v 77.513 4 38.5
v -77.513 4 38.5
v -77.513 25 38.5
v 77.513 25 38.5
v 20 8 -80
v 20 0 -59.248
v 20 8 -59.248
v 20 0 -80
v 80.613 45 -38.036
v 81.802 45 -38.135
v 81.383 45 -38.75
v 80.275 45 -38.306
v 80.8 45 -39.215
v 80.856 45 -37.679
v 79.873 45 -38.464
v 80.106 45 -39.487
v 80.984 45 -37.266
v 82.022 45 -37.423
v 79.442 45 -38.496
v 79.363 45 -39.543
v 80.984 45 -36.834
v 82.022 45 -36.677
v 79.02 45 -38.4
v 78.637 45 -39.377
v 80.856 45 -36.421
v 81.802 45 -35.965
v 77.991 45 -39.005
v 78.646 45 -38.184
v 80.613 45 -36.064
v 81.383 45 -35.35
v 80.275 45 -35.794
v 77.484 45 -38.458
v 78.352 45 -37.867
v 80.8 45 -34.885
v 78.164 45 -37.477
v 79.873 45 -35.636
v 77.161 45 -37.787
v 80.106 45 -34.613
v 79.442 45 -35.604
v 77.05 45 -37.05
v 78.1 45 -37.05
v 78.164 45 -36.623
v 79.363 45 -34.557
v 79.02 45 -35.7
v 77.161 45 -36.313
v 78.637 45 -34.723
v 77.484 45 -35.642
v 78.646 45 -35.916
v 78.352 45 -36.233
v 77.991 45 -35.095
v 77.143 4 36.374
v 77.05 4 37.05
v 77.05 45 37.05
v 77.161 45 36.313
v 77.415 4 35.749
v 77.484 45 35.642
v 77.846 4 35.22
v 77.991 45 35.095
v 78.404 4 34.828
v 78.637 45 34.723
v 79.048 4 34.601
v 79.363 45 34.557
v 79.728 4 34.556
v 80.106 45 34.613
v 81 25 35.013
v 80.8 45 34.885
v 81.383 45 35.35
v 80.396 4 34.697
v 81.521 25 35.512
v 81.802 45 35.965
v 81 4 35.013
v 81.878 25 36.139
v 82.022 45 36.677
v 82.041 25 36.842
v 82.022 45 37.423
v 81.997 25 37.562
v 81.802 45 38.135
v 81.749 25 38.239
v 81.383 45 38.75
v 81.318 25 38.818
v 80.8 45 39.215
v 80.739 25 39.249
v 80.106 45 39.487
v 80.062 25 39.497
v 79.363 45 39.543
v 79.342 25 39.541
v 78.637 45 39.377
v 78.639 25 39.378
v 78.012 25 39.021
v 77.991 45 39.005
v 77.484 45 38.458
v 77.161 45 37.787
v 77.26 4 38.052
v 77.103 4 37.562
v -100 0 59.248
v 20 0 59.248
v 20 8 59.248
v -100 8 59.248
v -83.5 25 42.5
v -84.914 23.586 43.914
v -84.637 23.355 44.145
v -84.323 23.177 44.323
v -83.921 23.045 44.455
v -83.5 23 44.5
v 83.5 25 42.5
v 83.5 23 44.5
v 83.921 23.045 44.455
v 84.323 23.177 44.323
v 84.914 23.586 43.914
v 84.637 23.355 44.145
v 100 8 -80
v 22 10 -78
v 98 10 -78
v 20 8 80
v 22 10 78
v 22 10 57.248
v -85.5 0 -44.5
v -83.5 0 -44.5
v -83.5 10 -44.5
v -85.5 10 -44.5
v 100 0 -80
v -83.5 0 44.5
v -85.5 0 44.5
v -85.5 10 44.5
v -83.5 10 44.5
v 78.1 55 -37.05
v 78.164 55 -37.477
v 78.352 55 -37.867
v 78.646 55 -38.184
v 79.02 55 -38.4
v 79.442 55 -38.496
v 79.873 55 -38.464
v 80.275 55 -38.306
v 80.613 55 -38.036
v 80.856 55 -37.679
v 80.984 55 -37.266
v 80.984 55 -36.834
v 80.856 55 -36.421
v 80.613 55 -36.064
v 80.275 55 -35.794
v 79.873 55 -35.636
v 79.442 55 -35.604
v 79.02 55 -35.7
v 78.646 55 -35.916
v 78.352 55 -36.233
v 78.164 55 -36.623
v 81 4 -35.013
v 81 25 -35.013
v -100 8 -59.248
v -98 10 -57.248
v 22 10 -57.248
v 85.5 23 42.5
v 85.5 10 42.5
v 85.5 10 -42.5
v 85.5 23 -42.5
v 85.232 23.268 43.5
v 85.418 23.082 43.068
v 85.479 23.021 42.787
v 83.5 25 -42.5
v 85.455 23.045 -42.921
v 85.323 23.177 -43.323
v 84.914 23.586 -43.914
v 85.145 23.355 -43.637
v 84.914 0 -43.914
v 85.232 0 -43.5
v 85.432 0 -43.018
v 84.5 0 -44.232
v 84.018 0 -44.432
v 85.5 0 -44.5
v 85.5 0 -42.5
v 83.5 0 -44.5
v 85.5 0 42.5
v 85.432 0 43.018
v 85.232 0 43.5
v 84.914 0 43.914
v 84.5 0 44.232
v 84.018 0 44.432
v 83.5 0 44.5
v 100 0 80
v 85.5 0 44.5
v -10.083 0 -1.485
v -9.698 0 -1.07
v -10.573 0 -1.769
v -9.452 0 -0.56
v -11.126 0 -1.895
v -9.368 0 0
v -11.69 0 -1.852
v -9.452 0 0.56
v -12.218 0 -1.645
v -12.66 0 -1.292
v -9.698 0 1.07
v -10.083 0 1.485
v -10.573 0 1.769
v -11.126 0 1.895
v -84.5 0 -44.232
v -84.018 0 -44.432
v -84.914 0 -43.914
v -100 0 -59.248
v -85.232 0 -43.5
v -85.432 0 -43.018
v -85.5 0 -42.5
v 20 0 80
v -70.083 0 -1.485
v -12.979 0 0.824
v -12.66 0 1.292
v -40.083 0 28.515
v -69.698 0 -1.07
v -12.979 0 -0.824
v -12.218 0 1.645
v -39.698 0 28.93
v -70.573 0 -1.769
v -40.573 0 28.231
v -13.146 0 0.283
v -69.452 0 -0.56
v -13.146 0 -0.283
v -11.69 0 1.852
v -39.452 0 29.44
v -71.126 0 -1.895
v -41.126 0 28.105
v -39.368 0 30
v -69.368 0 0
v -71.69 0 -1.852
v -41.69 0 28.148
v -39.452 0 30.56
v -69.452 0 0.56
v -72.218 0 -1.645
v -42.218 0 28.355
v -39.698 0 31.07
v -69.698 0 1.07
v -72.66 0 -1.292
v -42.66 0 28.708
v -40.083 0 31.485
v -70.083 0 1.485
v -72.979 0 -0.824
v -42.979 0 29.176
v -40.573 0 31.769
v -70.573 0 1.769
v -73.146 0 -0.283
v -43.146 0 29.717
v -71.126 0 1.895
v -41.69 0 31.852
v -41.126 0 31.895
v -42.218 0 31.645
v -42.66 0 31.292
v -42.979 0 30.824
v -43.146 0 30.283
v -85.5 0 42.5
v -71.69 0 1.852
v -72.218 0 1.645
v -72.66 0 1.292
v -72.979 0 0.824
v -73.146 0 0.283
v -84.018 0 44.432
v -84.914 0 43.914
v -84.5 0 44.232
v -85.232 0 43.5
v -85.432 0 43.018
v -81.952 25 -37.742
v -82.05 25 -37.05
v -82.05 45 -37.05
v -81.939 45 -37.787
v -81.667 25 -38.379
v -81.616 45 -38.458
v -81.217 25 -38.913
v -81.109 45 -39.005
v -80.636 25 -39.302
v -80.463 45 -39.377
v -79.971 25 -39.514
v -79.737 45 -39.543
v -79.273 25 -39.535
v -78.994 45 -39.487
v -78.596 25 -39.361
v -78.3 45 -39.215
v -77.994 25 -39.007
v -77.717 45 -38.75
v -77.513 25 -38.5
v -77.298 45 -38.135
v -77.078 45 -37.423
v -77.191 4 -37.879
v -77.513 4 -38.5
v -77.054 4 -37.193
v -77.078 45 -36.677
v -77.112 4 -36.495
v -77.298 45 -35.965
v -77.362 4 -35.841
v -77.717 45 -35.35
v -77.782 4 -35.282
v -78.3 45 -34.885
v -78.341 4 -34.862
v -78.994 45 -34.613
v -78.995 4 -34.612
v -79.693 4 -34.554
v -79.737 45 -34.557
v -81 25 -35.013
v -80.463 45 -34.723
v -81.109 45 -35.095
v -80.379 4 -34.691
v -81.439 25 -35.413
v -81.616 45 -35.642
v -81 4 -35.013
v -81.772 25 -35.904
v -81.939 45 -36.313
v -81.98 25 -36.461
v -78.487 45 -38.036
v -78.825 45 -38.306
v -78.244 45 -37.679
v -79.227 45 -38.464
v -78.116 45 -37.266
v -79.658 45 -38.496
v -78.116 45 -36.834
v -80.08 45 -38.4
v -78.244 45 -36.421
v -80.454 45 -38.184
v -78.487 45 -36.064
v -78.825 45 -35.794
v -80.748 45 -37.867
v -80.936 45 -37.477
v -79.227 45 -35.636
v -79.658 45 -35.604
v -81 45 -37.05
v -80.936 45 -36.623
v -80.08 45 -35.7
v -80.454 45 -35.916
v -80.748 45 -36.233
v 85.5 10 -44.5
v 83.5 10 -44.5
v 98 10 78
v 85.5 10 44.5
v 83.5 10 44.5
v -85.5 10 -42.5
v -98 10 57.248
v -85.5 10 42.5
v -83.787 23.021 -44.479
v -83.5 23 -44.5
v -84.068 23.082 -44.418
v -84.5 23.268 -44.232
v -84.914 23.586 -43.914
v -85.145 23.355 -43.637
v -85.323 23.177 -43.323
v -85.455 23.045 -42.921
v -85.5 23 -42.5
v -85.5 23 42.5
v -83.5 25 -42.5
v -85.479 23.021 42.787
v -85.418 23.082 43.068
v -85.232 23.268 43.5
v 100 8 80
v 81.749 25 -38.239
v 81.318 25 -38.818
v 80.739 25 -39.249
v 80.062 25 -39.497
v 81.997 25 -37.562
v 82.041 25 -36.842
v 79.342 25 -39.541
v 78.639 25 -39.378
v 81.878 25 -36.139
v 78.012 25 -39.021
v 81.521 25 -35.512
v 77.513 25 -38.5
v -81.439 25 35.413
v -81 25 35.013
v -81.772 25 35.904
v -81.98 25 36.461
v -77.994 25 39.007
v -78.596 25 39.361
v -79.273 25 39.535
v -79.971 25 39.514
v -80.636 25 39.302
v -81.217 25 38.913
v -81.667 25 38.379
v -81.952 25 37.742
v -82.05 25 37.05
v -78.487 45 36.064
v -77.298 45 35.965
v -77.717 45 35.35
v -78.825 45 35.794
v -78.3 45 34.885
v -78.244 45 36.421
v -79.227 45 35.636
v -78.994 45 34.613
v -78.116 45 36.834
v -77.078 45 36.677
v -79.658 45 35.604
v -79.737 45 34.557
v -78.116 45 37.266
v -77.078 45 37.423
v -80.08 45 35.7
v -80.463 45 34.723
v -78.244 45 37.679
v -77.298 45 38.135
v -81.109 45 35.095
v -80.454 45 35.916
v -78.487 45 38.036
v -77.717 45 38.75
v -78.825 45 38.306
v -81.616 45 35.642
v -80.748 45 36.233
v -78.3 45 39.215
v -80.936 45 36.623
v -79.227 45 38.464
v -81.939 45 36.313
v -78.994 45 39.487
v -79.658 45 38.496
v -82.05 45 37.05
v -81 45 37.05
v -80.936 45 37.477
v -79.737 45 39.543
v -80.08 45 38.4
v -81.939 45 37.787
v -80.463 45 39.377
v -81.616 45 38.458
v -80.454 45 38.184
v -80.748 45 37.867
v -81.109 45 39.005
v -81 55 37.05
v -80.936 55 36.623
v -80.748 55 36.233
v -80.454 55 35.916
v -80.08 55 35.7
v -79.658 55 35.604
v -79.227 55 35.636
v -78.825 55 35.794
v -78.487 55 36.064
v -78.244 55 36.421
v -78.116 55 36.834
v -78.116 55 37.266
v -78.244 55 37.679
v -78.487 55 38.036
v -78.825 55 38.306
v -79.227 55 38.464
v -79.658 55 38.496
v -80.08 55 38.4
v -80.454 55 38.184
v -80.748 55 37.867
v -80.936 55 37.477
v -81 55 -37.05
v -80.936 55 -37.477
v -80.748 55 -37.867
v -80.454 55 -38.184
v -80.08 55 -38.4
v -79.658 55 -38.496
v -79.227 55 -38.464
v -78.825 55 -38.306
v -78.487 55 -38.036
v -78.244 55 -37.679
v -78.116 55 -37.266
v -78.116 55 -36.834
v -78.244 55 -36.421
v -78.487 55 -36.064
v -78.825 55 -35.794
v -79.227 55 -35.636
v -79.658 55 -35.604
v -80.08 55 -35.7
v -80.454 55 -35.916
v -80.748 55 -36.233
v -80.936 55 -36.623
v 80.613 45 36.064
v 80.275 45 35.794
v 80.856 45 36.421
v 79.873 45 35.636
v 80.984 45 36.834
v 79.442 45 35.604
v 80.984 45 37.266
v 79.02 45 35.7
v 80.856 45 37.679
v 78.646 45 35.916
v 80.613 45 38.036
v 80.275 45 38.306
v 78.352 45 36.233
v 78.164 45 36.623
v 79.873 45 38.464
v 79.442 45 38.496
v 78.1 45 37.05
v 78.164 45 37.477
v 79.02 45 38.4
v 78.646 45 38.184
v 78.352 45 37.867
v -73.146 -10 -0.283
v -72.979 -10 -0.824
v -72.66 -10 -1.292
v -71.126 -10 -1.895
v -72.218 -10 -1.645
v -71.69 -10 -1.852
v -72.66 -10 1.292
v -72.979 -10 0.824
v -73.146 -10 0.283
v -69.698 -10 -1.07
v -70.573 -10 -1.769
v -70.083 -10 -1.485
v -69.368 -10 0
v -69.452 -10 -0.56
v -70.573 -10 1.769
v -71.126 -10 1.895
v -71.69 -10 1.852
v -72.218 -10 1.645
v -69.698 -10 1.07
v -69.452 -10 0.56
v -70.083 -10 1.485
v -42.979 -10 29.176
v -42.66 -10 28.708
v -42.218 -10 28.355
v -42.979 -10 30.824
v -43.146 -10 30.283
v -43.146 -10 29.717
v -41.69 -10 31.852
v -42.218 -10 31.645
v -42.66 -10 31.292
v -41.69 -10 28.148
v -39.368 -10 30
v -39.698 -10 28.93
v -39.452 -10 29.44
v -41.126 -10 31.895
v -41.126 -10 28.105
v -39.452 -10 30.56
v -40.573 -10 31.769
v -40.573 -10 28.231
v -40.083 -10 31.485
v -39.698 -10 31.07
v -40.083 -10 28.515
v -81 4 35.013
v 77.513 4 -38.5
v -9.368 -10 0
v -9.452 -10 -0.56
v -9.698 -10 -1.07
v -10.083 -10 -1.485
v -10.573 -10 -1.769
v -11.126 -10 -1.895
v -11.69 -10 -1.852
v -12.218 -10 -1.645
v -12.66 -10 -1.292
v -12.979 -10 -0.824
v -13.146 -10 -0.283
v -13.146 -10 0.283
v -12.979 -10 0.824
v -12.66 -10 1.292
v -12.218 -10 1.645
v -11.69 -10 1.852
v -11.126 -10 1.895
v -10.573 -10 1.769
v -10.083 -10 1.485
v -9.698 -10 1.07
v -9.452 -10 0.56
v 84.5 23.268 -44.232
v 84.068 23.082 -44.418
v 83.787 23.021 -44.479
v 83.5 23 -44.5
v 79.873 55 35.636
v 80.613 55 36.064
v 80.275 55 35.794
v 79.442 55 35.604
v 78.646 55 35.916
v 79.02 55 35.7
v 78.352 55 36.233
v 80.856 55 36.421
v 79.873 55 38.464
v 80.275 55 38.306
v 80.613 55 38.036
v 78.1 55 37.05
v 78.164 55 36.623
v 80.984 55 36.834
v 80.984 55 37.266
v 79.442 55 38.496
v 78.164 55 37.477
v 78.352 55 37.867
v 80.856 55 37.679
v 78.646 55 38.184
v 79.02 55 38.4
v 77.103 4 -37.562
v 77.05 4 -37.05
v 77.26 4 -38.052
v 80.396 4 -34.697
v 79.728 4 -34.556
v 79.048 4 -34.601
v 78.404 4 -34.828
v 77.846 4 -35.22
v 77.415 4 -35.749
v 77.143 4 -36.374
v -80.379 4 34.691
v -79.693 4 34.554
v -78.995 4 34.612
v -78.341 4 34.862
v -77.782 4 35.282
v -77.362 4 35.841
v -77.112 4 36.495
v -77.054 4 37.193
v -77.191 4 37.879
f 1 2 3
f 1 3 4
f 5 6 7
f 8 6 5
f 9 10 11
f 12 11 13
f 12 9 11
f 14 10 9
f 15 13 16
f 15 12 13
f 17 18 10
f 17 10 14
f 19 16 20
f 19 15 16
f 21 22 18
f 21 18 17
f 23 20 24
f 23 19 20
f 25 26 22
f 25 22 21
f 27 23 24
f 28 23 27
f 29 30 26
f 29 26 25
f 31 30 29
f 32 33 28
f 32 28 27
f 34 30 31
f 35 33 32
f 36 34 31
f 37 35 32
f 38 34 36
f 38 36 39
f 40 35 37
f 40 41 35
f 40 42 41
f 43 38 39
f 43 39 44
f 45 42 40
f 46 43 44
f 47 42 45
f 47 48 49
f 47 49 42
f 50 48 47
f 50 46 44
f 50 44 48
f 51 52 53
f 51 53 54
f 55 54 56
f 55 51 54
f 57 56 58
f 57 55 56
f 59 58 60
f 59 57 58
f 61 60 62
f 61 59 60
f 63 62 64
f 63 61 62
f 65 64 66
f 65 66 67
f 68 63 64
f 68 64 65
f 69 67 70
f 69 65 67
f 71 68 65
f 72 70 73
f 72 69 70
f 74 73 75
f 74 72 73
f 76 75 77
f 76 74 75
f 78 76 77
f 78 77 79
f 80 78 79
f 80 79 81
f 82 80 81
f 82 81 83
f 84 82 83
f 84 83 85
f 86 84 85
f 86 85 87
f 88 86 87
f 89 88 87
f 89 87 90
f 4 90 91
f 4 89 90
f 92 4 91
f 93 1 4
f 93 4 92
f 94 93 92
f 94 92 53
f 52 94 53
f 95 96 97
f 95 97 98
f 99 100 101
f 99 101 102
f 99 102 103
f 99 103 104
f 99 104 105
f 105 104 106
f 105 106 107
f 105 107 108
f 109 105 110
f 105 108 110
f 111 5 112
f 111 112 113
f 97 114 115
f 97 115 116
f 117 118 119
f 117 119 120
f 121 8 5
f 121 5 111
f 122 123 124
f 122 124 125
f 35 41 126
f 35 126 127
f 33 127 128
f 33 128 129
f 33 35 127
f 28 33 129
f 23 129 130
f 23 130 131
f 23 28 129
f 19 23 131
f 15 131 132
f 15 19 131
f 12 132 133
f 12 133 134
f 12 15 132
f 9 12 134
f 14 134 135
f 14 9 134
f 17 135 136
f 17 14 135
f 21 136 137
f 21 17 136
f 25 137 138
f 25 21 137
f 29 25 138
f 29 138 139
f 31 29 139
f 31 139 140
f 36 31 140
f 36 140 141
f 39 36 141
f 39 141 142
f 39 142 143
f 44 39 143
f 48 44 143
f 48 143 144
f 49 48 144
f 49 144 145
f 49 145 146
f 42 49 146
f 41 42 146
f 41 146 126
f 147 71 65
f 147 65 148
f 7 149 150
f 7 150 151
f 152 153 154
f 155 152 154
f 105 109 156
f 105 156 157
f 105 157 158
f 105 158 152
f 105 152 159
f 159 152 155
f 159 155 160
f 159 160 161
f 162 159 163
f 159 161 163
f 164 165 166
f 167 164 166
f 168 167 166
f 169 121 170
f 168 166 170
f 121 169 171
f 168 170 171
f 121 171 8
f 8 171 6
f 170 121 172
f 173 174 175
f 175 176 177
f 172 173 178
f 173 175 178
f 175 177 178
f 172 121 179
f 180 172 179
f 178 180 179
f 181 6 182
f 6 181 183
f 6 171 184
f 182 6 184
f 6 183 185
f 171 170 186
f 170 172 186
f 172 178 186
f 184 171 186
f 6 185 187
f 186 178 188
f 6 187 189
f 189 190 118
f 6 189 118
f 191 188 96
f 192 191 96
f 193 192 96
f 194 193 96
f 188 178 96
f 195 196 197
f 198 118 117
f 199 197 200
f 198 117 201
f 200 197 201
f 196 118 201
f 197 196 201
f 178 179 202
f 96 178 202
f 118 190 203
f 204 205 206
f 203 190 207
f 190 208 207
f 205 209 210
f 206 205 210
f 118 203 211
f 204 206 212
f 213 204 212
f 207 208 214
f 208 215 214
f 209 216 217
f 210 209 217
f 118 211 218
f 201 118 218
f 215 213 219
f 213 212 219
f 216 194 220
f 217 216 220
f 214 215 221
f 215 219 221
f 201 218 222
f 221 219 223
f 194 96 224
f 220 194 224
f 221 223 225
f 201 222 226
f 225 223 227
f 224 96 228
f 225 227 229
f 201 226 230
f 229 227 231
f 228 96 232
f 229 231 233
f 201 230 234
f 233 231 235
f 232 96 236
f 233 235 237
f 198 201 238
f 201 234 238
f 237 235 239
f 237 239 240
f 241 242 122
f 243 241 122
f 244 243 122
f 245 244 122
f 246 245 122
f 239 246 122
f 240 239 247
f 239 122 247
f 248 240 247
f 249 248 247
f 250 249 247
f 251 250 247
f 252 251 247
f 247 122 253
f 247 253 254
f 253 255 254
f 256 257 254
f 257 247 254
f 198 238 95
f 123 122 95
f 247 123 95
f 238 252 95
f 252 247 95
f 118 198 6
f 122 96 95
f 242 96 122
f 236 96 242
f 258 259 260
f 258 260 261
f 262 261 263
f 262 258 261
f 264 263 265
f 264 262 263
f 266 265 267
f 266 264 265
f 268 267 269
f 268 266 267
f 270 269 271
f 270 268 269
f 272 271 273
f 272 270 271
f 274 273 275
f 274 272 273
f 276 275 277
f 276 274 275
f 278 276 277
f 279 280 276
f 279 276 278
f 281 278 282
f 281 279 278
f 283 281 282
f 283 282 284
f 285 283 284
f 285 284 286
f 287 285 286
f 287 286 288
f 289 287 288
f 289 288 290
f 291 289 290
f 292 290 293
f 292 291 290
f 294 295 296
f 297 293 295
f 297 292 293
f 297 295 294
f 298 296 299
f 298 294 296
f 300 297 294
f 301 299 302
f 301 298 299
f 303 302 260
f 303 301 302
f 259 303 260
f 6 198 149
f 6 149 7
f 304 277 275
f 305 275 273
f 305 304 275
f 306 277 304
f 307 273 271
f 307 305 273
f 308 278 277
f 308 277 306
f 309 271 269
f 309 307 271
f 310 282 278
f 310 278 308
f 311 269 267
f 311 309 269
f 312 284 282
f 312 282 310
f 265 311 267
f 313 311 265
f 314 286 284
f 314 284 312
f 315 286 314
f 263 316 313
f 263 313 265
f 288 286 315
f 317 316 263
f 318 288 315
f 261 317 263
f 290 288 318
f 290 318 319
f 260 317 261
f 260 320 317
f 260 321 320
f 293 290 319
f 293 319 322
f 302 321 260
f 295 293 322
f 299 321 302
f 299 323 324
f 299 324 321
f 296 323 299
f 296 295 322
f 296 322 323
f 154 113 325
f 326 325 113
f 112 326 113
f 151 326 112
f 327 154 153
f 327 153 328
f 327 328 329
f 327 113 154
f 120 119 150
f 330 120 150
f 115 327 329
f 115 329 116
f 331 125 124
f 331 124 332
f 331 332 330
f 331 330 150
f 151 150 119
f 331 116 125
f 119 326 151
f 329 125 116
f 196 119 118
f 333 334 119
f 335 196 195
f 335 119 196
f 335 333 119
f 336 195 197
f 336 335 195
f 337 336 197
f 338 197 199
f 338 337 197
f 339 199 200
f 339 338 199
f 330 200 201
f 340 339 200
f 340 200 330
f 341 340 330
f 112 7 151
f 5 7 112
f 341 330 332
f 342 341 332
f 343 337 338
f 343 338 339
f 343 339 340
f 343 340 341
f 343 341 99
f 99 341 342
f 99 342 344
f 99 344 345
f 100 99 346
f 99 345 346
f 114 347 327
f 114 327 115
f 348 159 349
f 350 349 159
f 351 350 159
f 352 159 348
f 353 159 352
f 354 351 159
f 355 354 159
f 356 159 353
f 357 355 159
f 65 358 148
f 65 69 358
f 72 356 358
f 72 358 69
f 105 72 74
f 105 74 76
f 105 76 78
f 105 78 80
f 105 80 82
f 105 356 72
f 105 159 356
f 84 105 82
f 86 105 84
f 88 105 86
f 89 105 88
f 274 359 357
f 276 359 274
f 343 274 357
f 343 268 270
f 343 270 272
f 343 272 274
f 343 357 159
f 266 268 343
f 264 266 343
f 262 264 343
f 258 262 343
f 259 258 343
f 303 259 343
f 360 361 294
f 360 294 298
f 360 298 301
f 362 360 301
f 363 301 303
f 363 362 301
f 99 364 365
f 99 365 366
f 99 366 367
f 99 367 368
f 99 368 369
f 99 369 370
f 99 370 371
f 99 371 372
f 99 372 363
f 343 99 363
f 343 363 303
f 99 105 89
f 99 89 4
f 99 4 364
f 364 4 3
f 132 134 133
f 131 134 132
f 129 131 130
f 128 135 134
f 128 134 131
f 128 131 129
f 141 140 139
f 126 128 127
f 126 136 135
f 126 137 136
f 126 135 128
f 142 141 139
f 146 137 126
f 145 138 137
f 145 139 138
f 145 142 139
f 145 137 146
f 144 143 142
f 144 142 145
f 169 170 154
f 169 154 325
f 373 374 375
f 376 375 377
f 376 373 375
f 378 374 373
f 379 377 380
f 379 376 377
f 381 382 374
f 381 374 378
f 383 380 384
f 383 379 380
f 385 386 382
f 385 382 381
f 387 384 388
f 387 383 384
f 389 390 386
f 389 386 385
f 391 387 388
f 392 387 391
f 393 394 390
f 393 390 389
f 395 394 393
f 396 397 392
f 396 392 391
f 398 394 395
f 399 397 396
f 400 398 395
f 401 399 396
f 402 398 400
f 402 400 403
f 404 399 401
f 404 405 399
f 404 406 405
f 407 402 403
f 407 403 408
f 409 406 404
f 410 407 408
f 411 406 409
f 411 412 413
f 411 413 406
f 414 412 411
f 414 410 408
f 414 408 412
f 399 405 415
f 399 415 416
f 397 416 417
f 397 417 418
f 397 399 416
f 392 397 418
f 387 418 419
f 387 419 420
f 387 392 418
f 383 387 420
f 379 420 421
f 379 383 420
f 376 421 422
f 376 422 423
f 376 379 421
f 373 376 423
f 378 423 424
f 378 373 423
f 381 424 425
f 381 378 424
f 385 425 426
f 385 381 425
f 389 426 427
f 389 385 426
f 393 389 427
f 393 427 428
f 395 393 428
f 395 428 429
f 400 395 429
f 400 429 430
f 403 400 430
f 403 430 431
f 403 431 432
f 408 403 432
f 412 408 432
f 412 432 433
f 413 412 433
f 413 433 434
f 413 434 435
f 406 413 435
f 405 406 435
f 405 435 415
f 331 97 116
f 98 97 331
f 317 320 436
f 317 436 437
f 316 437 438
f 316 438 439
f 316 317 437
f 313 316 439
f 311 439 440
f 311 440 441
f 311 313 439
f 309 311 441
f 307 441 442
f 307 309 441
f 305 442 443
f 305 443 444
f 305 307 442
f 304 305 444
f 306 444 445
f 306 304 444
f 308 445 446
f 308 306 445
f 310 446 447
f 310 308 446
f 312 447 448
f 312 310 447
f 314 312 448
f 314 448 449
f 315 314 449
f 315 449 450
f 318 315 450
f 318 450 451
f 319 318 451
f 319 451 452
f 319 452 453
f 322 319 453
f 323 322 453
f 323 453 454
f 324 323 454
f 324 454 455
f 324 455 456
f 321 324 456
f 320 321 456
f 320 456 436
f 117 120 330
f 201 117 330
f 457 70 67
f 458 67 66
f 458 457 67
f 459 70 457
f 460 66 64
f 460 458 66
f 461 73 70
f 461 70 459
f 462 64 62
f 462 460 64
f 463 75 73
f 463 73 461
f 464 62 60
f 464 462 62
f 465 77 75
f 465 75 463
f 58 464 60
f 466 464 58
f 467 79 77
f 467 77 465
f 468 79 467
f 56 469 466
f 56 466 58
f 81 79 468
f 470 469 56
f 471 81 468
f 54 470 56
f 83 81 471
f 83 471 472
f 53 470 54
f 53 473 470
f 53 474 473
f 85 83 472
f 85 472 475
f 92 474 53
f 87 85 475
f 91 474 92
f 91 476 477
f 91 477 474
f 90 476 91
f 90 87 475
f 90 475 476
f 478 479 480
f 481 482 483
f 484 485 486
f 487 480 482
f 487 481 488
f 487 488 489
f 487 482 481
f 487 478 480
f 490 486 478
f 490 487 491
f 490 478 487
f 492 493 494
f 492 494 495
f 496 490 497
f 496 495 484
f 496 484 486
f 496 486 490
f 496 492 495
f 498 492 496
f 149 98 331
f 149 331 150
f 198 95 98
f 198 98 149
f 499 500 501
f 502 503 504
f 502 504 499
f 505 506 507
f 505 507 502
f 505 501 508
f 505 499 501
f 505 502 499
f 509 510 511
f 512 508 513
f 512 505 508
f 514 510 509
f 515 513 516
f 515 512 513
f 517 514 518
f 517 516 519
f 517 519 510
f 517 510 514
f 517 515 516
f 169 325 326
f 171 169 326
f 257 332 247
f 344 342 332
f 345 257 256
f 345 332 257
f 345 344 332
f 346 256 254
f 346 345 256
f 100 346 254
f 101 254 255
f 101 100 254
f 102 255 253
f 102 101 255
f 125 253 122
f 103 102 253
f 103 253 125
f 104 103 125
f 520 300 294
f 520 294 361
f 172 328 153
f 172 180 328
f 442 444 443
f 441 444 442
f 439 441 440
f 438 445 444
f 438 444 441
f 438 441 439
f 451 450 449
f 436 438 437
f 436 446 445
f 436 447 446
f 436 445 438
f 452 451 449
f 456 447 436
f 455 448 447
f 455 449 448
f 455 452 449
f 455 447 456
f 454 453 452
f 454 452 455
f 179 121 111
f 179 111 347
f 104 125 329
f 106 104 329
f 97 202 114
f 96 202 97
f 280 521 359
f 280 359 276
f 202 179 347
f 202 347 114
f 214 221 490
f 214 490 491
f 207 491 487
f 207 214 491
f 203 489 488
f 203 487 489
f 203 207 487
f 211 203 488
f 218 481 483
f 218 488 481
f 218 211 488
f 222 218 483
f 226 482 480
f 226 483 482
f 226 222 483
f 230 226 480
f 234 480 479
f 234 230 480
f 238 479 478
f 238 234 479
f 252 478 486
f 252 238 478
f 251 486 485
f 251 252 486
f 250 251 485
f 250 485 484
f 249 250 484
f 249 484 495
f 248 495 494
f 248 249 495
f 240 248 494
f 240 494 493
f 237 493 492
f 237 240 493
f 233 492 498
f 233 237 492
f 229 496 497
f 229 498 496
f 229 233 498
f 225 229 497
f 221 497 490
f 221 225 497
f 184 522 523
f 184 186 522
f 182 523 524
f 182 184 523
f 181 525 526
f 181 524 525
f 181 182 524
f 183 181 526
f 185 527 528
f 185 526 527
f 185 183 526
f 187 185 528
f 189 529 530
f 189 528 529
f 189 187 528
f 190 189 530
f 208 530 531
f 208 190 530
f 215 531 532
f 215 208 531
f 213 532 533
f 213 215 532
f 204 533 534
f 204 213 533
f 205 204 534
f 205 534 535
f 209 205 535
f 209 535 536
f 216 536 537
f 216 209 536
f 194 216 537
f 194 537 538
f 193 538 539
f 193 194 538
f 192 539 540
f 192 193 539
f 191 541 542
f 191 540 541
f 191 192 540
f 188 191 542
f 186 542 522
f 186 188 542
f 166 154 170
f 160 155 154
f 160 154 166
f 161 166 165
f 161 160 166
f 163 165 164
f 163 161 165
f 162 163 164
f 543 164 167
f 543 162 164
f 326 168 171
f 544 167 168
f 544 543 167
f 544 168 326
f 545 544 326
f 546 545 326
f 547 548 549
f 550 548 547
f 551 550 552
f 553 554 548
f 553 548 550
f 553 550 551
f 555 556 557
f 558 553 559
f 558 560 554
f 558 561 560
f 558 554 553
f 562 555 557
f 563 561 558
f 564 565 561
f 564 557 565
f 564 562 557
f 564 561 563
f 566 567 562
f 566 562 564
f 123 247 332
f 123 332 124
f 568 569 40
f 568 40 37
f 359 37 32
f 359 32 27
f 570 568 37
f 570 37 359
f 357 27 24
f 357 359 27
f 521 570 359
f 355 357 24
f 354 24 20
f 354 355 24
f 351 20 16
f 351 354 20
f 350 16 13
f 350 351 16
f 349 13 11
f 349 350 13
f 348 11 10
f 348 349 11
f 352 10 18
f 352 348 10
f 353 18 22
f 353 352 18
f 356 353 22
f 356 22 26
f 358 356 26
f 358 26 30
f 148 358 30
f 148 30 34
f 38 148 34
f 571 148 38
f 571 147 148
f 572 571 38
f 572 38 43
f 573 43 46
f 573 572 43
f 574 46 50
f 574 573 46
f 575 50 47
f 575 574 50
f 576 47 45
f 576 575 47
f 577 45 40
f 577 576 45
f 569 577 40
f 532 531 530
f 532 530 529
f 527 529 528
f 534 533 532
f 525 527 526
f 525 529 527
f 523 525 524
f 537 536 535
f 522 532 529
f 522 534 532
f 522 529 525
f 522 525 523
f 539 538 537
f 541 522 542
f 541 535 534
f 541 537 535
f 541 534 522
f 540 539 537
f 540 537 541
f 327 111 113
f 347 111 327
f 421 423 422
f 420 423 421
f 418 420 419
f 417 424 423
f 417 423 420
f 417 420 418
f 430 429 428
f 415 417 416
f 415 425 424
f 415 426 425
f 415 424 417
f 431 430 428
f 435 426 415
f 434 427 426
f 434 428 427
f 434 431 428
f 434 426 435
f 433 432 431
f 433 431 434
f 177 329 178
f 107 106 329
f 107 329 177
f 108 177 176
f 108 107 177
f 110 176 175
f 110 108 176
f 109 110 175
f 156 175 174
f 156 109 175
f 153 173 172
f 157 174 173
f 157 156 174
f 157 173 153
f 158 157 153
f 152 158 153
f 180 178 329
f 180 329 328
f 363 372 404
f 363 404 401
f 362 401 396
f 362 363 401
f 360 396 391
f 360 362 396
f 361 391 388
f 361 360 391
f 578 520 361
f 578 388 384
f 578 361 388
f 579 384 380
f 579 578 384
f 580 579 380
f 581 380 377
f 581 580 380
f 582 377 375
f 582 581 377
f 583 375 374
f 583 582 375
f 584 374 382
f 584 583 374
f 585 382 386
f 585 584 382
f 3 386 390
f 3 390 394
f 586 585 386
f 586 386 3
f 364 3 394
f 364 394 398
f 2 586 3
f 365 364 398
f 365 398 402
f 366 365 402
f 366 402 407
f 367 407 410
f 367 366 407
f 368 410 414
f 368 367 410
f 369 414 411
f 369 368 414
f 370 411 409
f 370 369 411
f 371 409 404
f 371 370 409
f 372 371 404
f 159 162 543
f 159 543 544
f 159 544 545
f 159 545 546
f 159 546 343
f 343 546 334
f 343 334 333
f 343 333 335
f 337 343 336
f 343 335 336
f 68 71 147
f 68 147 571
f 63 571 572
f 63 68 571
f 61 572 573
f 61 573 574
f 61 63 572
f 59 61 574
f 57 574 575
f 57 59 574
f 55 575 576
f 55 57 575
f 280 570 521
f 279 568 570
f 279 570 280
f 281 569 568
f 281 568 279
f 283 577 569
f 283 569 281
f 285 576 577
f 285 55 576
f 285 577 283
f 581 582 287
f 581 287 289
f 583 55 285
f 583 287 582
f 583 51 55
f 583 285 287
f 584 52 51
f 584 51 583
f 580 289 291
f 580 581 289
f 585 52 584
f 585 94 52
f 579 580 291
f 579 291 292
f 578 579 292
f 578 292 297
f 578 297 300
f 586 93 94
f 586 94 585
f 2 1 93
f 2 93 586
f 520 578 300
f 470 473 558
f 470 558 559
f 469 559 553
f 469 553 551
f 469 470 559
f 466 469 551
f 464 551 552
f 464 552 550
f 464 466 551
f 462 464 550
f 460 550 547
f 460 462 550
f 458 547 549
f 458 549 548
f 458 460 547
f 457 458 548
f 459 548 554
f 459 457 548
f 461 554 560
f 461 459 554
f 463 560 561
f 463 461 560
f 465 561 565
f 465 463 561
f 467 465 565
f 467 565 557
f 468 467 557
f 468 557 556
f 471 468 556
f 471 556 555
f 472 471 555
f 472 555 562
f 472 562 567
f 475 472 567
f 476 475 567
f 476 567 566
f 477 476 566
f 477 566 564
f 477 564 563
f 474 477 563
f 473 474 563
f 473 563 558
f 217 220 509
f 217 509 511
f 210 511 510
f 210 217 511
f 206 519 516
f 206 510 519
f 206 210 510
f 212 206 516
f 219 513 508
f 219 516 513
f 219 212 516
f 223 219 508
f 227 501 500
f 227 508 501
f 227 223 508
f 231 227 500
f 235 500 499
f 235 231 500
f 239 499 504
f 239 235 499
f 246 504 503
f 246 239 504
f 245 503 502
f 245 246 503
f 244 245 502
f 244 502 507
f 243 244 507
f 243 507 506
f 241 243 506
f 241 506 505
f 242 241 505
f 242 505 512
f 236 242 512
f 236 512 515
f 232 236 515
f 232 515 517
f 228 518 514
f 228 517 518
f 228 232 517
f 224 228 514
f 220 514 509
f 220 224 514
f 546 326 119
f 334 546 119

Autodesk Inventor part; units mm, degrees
ref_plane "YZ Plane" through (0, 0, 0) normal (1, 0, 0) x (0, 1, 0)
ref_plane "XZ Plane" through (0, 0, 0) normal (0, 1, 0) x (-1, 0, 0)
ref_plane "XY Plane" through (0, 0, 0) normal (0, 0, 1) x (1, 0, 0)
sketch "Sketch1" plane through (0, 0, 0) normal (0, 1, 0) x (-1, 0, 0)
  line L0 (-85.5, -44.5) -> (85.5, -44.5)
  line L1 (85.5, -44.5) -> (85.5, 44.5)
  line L2 (85.5, 44.5) -> (-85.5, 44.5)
  line L3 (-85.5, 44.5) -> (-85.5, -44.5)
  line L4 (-85.5, -44.5) -> (85.5, 44.5) construction
  line L5 (85.5, -44.5) -> (-85.5, 44.5) construction
  line L6 (-81, -38.5) -> (81, -38.5)
  line L7 (81, -38.5) -> (81, 38.5)
  line L8 (81, 38.5) -> (-81, 38.5)
  line L9 (-81, 38.5) -> (-81, -38.5)
  line L10 (-81, -38.5) -> (81, 38.5) construction
  line L11 (81, -38.5) -> (-81, 38.5) construction
  line L12 (81, 38.5) -> (79.55, 38.5)
  line L13 (81, 37.05) -> (81, 38.5)
  circle A0 centre (79.55, 37.05) radius 1.45
  circle A1 centre (79.55, -37.05) radius 1.45
  circle A2 centre (-79.55, -37.05) radius 1.45
  circle A3 centre (-79.55, 37.05) radius 1.45
  line L14 (81, 38.5) -> (78.1, 38.5)
  line L15 (78.1, 38.5) -> (78.1, 35.6)
  line L16 (78.1, 35.6) -> (81, 35.6)
  line L17 (81, 35.6) -> (81, 38.5)
  line L18 (81, 38.5) -> (78.1, 35.6) construction
  line L19 (78.1, 38.5) -> (81, 35.6) construction
  line L20 (81, -35.6) -> (78.1, -35.6)
  line L21 (78.1, -35.6) -> (78.1, -38.5)
  line L22 (78.1, -38.5) -> (81, -38.5)
  line L23 (81, -38.5) -> (81, -35.6)
  line L24 (81, -35.6) -> (78.1, -38.5) construction
  line L25 (78.1, -35.6) -> (81, -38.5) construction
  line L26 (-81, -38.5) -> (-78.1, -38.5)
  line L27 (-78.1, -35.6) -> (-81, -38.5) construction
  line L28 (-81, -35.6) -> (-78.1, -38.5) construction
  line L29 (-78.1, 38.5) -> (-81, 38.5)
  line L30 (-81, 38.5) -> (-81, 35.6)
  line L31 (-78.1, 38.5) -> (-81, 35.6) construction
  line L32 (-81, 38.5) -> (-78.1, 35.6) construction
  circle A4 centre (-79.55, 37.05) radius 2.5
  line L33 (-95.5566, 0) -> (75.4434, 0)
  line L34 (0, 31.9167) -> (0, -57.0833)
  circle A5 centre (-79.55, -37.05) radius 2.5
  circle A6 centre (79.55, 37.05) radius 2.5
  circle A7 centre (79.55, -37.05) radius 2.5
  line L35 (140, 0) -> (-140, 0) projected
  line L36 (0, -112) -> (0, 112) projected
  line L37 (-100, 59.2475) -> (100, 59.2475)
  line L38 (100, 59.2475) -> (100, -59.2475)
  line L39 (100, -59.2475) -> (-100, -59.2475)
  line L40 (-100, -59.2475) -> (-100, 59.2475)
  line L41 (-100, 59.2475) -> (100, -59.2475) construction
  line L42 (100, 59.2475) -> (-100, -59.2475) construction
  line L43 (-100, 80) -> (-20, 80)
  line L44 (-20, 80) -> (-20, -80)
  line L45 (-20, -80) -> (-100, -80)
  line L46 (-100, -80) -> (-100, 80)
  line L47 (-100, 80) -> (-20, -80) construction
  line L48 (-20, 80) -> (-100, -80) construction
  point P0 (0, 0)
  point P1 (-79.55, 38.5)
  point P2 (-81, 37.05)
  point P3 (-81, -37.05)
  point P4 (-79.55, -38.5)
  point P5 (79.55, -38.5)
  point P6 (81, -37.05)
  point P7 (-60, 0)
  point P8 (-20, 59.2475)
  point P9 (-20, -59.2475)
  dimension "d0" = 171
  dimension "d1" = 89
  dimension "d2" = 162
  dimension "d3" = 77
  dimension "d7" = 2.9
  dimension "d8" = 2.9
  dimension "d9" = 2.9
  dimension "d10" = 2.9
  dimension "d53" = 5
  dimension "d56" = 200
  dimension "d57" = 80
  dimension "d58" = 160
extrude "Extrusion1" add sketch "Sketch1" along normal blind 55 contours A2 | A3 | A1 | A0
extrude "Extrusion2" add sketch "Sketch1" along normal blind 4 contours L44 L33 L34 L6 | L6 A5 L9 L33 L44 | L9 A4 L8 L44 L33 | L34 L33 L35 L7 A7 L6 | L6 A2 L9 A5 | L44 L8 L36 L34 L33 | L9 A3 L8 A4 | A7 L7 L20 L21 L6 | L34 L36 L8 A6 L7 L35 L33 | L21 A1 L6 | A6 L8 L15 L16 L7 | L21 L20 A1 | L7 A1 L20 | L16 A0 L7 | L8 A0 L15 | L16 L15 A0
extrude "Extrusion3" add sketch "Sketch1" along normal blind 25 contours L3 L33 L9 A5 L6 L44 L0 | L44 L6 L34 L0 | L3 L2 L44 L8 A4 L9 L33 | L34 L6 A7 L7 L35 L1 L0 | A5 L9 L6 | L2 L36 L8 L44 | A4 L8 L9 | L35 L7 A6 L8 L36 L2 L1 | L6 L7 A7 | L7 L8 A6
chamfer "Chamfer1" distance 2 angle 45 4 edges at (0, 25, 44.5) (85.5, 25, 0) (0, 25, -44.5) (-85.5, 25, 0)
fillet "Fillet6" radius 2 1 edges at (85.5, 11.5, 44.5)
fillet "Fillet7" radius 2 1 edges at (85.5, 11.5, -44.5)
fillet "Fillet8" radius 2 1 edges at (-85.5, 11.5, 44.5)
fillet "Fillet9" radius 2 1 edges at (-85.5, 11.5, -44.5)
extrude "Extrusion11" add sketch "Sketch1" along normal blind 45 contours A5 L9 L6 | L6 A2 L9 A5 | A4 L8 L9 | L9 A3 L8 A4 | A7 L7 L20 L21 L6 | L6 L7 A7 | A2 L6 L9 | A2 | L21 A1 L6 | L9 L8 A3 | A3 | A6 L8 L15 L16 L7 | L7 L8 A6 | A1 L7 L6 | A1 | L21 L20 A1 | L7 A1 L20 | L16 A0 L7 | L8 A0 L15 | A0 L8 L7 | A0 | L16 L15 A0
extrude "Extrusion12" add sketch "Sketch1" along normal blind 10 contours L0 L44 L39 L40 L35 L33 L3 | L0 L34 L36 L39 L44 | L33 L35 L40 L37 L44 L2 L3 | L0 L1 L35 L38 L39 L36 L34 | L44 L45 L46 L39 | L44 L37 L36 L2 | L1 L2 L36 L37 L38 L35 | L37 L46 L43 L44
chamfer "Chamfer2" distance 2 angle 45 8 edges at (100, 10, 0) (60, 10, 80) (20, 10, 69.6238) (60, 10, -80) (20, 10, -69.6238) (-40, 10, -59.2475) (-40, 10, 59.2475) (-100, 10, 0)
sketch "Sketch4" plane through (0, 0, 0) normal (0, -1, 0) x (1, 0, 0)
  circle A0 centre (-11.2675, 0) radius 2 projected
  circle A1 centre (-71.2675, 0) radius 2 projected
  circle A2 centre (-41.2675, 30) radius 2 projected
  circle A3 centre (-11.2675, 0) radius 1.9
  circle A4 centre (-71.2675, 0) radius 1.9
  circle A5 centre (-41.2675, 30) radius 1.9
  point P0 (0, 0)
  dimension "d64" = 3.8
extrude "Extrusion13" add sketch "Sketch4" along normal blind 10 contours A3 | A4 | A5
properties part number "Buggy_Body_Wheel_Wells"
